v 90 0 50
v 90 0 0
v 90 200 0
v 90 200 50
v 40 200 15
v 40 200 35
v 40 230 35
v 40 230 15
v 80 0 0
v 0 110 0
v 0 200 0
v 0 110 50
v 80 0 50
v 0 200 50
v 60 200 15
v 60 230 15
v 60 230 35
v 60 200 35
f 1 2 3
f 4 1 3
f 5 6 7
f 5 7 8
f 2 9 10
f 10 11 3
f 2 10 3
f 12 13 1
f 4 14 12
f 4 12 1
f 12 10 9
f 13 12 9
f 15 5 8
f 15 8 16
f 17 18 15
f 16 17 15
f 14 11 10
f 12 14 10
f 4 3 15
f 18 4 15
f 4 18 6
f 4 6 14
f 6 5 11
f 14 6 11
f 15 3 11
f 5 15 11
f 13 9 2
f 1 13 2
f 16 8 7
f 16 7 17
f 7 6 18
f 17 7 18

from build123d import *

# Parameters (mm, degrees)
SALIENTE_EXTRUIR3_DEPTH = 50
CROQUIS3_W              = 20
CROQUIS3_H              = 20
SALIENTE_EXTRUIR4_DEPTH = 30


with BuildPart() as part:
    # Croquis2 → Saliente-Extruir3 (new body)
    with BuildSketch(Plane.XY):
        Polygon((0, 200), (0, 110), (80, 0), (90, 0), (90, 200), align=None)
    extrude(amount=SALIENTE_EXTRUIR3_DEPTH)

    # Croquis3 → Saliente-Extruir4 (add)
    with BuildSketch(Plane(origin=(0, 200, 0), x_dir=(1, 0, 0), z_dir=(0, 1, 0))):
        with Locations((50, -25)):
            Rectangle(CROQUIS3_W, CROQUIS3_H)
    extrude(amount=SALIENTE_EXTRUIR4_DEPTH)


solid = part.part
